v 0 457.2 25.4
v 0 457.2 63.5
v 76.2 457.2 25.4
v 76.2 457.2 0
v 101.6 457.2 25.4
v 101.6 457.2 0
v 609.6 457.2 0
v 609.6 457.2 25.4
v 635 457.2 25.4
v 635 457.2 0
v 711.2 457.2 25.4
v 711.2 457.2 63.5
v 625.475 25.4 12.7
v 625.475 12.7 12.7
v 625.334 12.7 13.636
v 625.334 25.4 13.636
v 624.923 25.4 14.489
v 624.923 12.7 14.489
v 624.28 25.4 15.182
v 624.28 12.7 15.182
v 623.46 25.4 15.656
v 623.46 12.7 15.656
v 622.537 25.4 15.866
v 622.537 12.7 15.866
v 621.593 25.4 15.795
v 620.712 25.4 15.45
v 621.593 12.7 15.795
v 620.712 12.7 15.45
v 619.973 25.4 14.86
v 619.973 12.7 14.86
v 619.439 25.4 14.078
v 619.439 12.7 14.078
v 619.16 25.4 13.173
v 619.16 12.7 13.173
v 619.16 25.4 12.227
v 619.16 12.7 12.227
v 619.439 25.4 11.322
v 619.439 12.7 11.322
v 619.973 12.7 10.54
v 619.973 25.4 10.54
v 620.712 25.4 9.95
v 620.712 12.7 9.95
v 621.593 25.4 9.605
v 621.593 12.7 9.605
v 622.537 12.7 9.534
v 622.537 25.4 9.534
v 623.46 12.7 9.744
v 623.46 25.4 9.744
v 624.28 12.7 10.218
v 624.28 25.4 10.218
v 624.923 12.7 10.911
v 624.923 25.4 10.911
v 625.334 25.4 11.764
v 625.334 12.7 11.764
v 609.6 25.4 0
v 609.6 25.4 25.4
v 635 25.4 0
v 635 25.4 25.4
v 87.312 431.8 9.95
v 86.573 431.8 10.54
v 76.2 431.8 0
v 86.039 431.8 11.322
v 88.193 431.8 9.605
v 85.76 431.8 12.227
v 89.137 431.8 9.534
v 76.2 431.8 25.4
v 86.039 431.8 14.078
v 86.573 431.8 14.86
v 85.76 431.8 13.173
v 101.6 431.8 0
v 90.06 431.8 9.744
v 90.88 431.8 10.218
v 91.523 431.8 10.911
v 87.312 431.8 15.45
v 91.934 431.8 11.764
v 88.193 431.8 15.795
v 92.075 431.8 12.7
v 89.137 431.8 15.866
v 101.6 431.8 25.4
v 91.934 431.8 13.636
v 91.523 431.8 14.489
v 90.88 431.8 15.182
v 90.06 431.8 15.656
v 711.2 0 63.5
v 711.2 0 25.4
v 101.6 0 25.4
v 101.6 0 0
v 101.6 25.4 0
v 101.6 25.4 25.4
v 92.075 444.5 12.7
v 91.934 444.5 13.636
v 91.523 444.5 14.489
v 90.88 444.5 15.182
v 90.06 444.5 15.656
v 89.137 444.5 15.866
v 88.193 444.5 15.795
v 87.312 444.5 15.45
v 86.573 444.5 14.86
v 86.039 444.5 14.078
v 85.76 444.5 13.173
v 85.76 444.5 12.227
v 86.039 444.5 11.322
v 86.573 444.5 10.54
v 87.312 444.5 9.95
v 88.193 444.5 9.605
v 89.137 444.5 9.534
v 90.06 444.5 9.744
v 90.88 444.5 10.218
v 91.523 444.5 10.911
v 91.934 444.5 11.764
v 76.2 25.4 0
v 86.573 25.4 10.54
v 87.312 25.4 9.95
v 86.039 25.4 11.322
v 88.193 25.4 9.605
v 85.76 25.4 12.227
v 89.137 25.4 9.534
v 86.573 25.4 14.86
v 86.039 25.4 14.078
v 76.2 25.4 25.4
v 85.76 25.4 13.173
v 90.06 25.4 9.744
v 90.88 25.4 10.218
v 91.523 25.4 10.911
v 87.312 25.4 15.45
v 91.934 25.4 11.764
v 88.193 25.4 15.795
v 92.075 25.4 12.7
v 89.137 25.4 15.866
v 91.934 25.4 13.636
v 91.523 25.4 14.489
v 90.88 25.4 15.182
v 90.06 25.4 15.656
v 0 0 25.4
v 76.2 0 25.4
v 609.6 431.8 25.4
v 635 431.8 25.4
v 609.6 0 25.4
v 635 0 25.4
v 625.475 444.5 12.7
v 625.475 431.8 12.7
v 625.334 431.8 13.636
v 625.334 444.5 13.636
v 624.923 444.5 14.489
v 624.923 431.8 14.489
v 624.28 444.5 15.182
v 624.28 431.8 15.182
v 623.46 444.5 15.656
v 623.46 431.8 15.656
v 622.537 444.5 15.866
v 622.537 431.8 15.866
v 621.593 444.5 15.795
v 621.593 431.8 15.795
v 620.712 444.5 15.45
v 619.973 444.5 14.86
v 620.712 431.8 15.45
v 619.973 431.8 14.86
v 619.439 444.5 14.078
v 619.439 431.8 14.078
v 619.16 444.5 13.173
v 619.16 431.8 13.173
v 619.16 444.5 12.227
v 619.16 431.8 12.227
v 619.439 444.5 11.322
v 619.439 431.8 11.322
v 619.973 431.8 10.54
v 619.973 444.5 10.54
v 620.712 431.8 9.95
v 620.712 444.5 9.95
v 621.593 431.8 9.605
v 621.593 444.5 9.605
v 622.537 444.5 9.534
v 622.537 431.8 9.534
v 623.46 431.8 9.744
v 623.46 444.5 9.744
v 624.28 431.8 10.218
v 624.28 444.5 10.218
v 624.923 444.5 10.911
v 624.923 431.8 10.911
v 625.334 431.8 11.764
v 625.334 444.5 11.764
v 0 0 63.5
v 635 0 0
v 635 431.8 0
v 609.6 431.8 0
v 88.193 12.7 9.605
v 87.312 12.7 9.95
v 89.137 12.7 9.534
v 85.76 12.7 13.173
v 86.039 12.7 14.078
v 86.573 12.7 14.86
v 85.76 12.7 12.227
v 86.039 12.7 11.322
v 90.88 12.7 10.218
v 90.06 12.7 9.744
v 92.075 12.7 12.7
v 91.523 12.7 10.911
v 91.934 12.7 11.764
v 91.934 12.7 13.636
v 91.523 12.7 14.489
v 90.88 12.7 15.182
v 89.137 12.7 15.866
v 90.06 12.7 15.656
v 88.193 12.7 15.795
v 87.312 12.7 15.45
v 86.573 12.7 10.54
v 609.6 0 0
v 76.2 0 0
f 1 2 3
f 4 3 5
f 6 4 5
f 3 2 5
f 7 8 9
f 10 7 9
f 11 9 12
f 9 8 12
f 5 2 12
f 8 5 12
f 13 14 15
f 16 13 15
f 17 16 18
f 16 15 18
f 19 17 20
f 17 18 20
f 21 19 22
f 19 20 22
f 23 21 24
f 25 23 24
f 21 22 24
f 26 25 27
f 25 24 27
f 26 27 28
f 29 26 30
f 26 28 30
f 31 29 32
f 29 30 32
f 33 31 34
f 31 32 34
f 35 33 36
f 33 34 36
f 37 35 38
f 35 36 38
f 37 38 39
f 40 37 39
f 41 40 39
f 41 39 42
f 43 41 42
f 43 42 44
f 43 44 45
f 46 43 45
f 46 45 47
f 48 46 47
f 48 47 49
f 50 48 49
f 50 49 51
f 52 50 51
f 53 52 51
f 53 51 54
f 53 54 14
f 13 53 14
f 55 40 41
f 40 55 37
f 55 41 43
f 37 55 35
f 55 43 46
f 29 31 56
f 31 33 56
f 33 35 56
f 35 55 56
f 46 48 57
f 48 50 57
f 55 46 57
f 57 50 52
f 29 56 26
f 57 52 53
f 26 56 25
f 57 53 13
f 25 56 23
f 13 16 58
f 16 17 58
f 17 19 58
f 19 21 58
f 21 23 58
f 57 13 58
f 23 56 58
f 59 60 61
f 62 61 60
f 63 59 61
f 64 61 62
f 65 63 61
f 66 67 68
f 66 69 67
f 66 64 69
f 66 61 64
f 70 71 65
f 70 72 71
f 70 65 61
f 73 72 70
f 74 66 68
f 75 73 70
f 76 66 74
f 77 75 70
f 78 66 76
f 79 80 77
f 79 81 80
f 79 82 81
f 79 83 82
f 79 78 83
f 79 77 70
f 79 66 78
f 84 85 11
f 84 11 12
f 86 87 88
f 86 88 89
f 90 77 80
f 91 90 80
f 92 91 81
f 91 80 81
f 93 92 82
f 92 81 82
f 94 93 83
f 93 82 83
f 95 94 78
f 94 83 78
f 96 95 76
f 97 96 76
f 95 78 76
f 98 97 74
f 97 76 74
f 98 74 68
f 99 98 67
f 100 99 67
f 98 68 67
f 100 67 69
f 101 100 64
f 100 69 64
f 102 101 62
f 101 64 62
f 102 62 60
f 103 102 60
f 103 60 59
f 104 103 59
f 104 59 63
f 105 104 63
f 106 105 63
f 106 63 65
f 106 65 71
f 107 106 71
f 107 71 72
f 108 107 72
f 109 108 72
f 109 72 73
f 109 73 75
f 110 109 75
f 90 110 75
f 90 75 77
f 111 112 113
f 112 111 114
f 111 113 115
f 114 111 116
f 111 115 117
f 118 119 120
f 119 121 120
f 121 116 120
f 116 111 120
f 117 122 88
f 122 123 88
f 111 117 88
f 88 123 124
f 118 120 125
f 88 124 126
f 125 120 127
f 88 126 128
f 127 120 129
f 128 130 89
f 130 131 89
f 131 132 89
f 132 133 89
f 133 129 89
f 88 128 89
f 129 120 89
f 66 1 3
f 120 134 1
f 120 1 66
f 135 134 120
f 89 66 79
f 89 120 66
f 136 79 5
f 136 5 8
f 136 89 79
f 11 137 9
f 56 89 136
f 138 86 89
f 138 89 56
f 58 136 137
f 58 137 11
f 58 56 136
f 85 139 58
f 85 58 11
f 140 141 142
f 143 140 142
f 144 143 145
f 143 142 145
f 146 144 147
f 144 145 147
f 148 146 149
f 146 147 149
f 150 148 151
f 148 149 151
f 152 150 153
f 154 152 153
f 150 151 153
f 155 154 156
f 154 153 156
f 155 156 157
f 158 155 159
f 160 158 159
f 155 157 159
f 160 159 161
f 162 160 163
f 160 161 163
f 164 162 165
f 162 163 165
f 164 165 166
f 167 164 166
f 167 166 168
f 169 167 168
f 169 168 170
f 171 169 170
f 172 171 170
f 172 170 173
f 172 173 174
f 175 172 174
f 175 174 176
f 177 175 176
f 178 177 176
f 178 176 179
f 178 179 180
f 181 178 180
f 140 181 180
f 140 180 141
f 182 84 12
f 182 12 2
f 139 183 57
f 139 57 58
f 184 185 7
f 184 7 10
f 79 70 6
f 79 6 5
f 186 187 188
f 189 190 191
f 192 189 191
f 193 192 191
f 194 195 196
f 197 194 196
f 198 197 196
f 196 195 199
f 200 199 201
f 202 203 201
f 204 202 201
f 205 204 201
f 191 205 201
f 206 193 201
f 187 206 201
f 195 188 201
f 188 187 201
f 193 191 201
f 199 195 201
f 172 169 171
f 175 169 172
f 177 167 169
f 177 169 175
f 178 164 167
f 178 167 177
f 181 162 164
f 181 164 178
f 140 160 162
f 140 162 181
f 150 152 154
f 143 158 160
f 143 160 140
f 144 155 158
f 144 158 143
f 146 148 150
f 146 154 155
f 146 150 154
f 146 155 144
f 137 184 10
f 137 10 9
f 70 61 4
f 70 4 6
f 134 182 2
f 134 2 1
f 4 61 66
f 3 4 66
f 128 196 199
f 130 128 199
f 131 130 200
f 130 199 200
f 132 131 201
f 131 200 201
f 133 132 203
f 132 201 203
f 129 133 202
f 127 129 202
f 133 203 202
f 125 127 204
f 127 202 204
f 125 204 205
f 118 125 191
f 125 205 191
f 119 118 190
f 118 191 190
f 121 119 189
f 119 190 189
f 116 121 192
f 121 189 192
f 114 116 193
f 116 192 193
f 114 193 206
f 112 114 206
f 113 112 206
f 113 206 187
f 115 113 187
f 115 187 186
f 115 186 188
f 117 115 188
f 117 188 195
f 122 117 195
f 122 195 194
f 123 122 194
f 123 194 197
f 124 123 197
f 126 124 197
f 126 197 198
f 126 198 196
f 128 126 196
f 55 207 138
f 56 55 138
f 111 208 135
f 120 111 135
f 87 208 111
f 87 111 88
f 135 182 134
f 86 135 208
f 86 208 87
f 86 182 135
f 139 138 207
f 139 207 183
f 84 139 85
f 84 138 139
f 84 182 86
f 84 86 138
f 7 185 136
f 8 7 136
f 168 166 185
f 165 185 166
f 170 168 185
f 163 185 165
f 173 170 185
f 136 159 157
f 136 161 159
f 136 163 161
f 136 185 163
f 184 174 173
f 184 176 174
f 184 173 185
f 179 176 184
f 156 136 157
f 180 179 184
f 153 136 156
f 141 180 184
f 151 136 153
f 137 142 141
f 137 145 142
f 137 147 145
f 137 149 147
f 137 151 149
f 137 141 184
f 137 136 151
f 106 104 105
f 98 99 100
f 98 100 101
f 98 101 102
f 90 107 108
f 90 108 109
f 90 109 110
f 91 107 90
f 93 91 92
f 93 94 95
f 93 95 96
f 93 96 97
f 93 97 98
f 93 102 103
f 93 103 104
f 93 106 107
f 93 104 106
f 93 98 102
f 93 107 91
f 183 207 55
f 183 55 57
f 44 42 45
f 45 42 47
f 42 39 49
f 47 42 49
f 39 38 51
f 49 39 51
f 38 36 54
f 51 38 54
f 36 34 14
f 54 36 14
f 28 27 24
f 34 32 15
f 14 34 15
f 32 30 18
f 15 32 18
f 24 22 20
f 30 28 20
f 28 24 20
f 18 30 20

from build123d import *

# Parameters (mm, degrees)
F1_DEPTH = 457.2
F0_W     = 25.4
F0_H     = 25.4
F0_R     = 3.175
F2_DEPTH = 25.4
F3_START = -431.8
F3_DEPTH = 25.4
F4_START = -12.7
F4_DEPTH = 431.8


with BuildPart() as f1:
    # F0 (on Front) → F1 (new body)
    with BuildSketch(Plane.XZ):
        Polygon((711.2, 63.5), (0, 63.5), (0, 25.4), (76.2, 25.4), (101.6, 25.4), (609.6, 25.4), (635, 25.4), (711.2, 25.4), align=None)
    extrude(amount=-F1_DEPTH)

    # F0 (on Front) → F2 (join)
    with BuildSketch(Plane.XZ):
        with Locations((88.9, 12.7)):
            Rectangle(F0_W, F0_H)
        with Locations((88.9, 12.7)):
            Circle(F0_R, mode=Mode.SUBTRACT)
        with Locations((622.3, 12.7)):
            Rectangle(F0_W, F0_H)
        with Locations((622.3, 12.7)):
            Circle(F0_R, mode=Mode.SUBTRACT)
        with Locations((88.9, 12.7)):
            Circle(F0_R)
        with Locations((622.3, 12.7)):
            Circle(F0_R)
    extrude(amount=-F2_DEPTH)

    # F0 (on Front) → F3 (join)
    with BuildSketch(Plane.XZ.offset(F3_START)):
        with Locations((88.9, 12.7)):
            Rectangle(F0_W, F0_H)
        with Locations((88.9, 12.7)):
            Circle(F0_R, mode=Mode.SUBTRACT)
        with Locations((622.3, 12.7)):
            Rectangle(F0_W, F0_H)
        with Locations((622.3, 12.7)):
            Circle(F0_R, mode=Mode.SUBTRACT)
        with Locations((622.3, 12.7)):
            Circle(F0_R)
        with Locations((88.9, 12.7)):
            Circle(F0_R)
    extrude(amount=-F3_DEPTH)

    # F0 (on Front) → F4 (cut)
    with BuildSketch(Plane.XZ.offset(F4_START)):
        with Locations((88.9, 12.7)):
            Circle(F0_R)
        with Locations((622.3, 12.7)):
            Circle(F0_R)
    extrude(amount=-F4_DEPTH, mode=Mode.SUBTRACT)


solid = f1.part
